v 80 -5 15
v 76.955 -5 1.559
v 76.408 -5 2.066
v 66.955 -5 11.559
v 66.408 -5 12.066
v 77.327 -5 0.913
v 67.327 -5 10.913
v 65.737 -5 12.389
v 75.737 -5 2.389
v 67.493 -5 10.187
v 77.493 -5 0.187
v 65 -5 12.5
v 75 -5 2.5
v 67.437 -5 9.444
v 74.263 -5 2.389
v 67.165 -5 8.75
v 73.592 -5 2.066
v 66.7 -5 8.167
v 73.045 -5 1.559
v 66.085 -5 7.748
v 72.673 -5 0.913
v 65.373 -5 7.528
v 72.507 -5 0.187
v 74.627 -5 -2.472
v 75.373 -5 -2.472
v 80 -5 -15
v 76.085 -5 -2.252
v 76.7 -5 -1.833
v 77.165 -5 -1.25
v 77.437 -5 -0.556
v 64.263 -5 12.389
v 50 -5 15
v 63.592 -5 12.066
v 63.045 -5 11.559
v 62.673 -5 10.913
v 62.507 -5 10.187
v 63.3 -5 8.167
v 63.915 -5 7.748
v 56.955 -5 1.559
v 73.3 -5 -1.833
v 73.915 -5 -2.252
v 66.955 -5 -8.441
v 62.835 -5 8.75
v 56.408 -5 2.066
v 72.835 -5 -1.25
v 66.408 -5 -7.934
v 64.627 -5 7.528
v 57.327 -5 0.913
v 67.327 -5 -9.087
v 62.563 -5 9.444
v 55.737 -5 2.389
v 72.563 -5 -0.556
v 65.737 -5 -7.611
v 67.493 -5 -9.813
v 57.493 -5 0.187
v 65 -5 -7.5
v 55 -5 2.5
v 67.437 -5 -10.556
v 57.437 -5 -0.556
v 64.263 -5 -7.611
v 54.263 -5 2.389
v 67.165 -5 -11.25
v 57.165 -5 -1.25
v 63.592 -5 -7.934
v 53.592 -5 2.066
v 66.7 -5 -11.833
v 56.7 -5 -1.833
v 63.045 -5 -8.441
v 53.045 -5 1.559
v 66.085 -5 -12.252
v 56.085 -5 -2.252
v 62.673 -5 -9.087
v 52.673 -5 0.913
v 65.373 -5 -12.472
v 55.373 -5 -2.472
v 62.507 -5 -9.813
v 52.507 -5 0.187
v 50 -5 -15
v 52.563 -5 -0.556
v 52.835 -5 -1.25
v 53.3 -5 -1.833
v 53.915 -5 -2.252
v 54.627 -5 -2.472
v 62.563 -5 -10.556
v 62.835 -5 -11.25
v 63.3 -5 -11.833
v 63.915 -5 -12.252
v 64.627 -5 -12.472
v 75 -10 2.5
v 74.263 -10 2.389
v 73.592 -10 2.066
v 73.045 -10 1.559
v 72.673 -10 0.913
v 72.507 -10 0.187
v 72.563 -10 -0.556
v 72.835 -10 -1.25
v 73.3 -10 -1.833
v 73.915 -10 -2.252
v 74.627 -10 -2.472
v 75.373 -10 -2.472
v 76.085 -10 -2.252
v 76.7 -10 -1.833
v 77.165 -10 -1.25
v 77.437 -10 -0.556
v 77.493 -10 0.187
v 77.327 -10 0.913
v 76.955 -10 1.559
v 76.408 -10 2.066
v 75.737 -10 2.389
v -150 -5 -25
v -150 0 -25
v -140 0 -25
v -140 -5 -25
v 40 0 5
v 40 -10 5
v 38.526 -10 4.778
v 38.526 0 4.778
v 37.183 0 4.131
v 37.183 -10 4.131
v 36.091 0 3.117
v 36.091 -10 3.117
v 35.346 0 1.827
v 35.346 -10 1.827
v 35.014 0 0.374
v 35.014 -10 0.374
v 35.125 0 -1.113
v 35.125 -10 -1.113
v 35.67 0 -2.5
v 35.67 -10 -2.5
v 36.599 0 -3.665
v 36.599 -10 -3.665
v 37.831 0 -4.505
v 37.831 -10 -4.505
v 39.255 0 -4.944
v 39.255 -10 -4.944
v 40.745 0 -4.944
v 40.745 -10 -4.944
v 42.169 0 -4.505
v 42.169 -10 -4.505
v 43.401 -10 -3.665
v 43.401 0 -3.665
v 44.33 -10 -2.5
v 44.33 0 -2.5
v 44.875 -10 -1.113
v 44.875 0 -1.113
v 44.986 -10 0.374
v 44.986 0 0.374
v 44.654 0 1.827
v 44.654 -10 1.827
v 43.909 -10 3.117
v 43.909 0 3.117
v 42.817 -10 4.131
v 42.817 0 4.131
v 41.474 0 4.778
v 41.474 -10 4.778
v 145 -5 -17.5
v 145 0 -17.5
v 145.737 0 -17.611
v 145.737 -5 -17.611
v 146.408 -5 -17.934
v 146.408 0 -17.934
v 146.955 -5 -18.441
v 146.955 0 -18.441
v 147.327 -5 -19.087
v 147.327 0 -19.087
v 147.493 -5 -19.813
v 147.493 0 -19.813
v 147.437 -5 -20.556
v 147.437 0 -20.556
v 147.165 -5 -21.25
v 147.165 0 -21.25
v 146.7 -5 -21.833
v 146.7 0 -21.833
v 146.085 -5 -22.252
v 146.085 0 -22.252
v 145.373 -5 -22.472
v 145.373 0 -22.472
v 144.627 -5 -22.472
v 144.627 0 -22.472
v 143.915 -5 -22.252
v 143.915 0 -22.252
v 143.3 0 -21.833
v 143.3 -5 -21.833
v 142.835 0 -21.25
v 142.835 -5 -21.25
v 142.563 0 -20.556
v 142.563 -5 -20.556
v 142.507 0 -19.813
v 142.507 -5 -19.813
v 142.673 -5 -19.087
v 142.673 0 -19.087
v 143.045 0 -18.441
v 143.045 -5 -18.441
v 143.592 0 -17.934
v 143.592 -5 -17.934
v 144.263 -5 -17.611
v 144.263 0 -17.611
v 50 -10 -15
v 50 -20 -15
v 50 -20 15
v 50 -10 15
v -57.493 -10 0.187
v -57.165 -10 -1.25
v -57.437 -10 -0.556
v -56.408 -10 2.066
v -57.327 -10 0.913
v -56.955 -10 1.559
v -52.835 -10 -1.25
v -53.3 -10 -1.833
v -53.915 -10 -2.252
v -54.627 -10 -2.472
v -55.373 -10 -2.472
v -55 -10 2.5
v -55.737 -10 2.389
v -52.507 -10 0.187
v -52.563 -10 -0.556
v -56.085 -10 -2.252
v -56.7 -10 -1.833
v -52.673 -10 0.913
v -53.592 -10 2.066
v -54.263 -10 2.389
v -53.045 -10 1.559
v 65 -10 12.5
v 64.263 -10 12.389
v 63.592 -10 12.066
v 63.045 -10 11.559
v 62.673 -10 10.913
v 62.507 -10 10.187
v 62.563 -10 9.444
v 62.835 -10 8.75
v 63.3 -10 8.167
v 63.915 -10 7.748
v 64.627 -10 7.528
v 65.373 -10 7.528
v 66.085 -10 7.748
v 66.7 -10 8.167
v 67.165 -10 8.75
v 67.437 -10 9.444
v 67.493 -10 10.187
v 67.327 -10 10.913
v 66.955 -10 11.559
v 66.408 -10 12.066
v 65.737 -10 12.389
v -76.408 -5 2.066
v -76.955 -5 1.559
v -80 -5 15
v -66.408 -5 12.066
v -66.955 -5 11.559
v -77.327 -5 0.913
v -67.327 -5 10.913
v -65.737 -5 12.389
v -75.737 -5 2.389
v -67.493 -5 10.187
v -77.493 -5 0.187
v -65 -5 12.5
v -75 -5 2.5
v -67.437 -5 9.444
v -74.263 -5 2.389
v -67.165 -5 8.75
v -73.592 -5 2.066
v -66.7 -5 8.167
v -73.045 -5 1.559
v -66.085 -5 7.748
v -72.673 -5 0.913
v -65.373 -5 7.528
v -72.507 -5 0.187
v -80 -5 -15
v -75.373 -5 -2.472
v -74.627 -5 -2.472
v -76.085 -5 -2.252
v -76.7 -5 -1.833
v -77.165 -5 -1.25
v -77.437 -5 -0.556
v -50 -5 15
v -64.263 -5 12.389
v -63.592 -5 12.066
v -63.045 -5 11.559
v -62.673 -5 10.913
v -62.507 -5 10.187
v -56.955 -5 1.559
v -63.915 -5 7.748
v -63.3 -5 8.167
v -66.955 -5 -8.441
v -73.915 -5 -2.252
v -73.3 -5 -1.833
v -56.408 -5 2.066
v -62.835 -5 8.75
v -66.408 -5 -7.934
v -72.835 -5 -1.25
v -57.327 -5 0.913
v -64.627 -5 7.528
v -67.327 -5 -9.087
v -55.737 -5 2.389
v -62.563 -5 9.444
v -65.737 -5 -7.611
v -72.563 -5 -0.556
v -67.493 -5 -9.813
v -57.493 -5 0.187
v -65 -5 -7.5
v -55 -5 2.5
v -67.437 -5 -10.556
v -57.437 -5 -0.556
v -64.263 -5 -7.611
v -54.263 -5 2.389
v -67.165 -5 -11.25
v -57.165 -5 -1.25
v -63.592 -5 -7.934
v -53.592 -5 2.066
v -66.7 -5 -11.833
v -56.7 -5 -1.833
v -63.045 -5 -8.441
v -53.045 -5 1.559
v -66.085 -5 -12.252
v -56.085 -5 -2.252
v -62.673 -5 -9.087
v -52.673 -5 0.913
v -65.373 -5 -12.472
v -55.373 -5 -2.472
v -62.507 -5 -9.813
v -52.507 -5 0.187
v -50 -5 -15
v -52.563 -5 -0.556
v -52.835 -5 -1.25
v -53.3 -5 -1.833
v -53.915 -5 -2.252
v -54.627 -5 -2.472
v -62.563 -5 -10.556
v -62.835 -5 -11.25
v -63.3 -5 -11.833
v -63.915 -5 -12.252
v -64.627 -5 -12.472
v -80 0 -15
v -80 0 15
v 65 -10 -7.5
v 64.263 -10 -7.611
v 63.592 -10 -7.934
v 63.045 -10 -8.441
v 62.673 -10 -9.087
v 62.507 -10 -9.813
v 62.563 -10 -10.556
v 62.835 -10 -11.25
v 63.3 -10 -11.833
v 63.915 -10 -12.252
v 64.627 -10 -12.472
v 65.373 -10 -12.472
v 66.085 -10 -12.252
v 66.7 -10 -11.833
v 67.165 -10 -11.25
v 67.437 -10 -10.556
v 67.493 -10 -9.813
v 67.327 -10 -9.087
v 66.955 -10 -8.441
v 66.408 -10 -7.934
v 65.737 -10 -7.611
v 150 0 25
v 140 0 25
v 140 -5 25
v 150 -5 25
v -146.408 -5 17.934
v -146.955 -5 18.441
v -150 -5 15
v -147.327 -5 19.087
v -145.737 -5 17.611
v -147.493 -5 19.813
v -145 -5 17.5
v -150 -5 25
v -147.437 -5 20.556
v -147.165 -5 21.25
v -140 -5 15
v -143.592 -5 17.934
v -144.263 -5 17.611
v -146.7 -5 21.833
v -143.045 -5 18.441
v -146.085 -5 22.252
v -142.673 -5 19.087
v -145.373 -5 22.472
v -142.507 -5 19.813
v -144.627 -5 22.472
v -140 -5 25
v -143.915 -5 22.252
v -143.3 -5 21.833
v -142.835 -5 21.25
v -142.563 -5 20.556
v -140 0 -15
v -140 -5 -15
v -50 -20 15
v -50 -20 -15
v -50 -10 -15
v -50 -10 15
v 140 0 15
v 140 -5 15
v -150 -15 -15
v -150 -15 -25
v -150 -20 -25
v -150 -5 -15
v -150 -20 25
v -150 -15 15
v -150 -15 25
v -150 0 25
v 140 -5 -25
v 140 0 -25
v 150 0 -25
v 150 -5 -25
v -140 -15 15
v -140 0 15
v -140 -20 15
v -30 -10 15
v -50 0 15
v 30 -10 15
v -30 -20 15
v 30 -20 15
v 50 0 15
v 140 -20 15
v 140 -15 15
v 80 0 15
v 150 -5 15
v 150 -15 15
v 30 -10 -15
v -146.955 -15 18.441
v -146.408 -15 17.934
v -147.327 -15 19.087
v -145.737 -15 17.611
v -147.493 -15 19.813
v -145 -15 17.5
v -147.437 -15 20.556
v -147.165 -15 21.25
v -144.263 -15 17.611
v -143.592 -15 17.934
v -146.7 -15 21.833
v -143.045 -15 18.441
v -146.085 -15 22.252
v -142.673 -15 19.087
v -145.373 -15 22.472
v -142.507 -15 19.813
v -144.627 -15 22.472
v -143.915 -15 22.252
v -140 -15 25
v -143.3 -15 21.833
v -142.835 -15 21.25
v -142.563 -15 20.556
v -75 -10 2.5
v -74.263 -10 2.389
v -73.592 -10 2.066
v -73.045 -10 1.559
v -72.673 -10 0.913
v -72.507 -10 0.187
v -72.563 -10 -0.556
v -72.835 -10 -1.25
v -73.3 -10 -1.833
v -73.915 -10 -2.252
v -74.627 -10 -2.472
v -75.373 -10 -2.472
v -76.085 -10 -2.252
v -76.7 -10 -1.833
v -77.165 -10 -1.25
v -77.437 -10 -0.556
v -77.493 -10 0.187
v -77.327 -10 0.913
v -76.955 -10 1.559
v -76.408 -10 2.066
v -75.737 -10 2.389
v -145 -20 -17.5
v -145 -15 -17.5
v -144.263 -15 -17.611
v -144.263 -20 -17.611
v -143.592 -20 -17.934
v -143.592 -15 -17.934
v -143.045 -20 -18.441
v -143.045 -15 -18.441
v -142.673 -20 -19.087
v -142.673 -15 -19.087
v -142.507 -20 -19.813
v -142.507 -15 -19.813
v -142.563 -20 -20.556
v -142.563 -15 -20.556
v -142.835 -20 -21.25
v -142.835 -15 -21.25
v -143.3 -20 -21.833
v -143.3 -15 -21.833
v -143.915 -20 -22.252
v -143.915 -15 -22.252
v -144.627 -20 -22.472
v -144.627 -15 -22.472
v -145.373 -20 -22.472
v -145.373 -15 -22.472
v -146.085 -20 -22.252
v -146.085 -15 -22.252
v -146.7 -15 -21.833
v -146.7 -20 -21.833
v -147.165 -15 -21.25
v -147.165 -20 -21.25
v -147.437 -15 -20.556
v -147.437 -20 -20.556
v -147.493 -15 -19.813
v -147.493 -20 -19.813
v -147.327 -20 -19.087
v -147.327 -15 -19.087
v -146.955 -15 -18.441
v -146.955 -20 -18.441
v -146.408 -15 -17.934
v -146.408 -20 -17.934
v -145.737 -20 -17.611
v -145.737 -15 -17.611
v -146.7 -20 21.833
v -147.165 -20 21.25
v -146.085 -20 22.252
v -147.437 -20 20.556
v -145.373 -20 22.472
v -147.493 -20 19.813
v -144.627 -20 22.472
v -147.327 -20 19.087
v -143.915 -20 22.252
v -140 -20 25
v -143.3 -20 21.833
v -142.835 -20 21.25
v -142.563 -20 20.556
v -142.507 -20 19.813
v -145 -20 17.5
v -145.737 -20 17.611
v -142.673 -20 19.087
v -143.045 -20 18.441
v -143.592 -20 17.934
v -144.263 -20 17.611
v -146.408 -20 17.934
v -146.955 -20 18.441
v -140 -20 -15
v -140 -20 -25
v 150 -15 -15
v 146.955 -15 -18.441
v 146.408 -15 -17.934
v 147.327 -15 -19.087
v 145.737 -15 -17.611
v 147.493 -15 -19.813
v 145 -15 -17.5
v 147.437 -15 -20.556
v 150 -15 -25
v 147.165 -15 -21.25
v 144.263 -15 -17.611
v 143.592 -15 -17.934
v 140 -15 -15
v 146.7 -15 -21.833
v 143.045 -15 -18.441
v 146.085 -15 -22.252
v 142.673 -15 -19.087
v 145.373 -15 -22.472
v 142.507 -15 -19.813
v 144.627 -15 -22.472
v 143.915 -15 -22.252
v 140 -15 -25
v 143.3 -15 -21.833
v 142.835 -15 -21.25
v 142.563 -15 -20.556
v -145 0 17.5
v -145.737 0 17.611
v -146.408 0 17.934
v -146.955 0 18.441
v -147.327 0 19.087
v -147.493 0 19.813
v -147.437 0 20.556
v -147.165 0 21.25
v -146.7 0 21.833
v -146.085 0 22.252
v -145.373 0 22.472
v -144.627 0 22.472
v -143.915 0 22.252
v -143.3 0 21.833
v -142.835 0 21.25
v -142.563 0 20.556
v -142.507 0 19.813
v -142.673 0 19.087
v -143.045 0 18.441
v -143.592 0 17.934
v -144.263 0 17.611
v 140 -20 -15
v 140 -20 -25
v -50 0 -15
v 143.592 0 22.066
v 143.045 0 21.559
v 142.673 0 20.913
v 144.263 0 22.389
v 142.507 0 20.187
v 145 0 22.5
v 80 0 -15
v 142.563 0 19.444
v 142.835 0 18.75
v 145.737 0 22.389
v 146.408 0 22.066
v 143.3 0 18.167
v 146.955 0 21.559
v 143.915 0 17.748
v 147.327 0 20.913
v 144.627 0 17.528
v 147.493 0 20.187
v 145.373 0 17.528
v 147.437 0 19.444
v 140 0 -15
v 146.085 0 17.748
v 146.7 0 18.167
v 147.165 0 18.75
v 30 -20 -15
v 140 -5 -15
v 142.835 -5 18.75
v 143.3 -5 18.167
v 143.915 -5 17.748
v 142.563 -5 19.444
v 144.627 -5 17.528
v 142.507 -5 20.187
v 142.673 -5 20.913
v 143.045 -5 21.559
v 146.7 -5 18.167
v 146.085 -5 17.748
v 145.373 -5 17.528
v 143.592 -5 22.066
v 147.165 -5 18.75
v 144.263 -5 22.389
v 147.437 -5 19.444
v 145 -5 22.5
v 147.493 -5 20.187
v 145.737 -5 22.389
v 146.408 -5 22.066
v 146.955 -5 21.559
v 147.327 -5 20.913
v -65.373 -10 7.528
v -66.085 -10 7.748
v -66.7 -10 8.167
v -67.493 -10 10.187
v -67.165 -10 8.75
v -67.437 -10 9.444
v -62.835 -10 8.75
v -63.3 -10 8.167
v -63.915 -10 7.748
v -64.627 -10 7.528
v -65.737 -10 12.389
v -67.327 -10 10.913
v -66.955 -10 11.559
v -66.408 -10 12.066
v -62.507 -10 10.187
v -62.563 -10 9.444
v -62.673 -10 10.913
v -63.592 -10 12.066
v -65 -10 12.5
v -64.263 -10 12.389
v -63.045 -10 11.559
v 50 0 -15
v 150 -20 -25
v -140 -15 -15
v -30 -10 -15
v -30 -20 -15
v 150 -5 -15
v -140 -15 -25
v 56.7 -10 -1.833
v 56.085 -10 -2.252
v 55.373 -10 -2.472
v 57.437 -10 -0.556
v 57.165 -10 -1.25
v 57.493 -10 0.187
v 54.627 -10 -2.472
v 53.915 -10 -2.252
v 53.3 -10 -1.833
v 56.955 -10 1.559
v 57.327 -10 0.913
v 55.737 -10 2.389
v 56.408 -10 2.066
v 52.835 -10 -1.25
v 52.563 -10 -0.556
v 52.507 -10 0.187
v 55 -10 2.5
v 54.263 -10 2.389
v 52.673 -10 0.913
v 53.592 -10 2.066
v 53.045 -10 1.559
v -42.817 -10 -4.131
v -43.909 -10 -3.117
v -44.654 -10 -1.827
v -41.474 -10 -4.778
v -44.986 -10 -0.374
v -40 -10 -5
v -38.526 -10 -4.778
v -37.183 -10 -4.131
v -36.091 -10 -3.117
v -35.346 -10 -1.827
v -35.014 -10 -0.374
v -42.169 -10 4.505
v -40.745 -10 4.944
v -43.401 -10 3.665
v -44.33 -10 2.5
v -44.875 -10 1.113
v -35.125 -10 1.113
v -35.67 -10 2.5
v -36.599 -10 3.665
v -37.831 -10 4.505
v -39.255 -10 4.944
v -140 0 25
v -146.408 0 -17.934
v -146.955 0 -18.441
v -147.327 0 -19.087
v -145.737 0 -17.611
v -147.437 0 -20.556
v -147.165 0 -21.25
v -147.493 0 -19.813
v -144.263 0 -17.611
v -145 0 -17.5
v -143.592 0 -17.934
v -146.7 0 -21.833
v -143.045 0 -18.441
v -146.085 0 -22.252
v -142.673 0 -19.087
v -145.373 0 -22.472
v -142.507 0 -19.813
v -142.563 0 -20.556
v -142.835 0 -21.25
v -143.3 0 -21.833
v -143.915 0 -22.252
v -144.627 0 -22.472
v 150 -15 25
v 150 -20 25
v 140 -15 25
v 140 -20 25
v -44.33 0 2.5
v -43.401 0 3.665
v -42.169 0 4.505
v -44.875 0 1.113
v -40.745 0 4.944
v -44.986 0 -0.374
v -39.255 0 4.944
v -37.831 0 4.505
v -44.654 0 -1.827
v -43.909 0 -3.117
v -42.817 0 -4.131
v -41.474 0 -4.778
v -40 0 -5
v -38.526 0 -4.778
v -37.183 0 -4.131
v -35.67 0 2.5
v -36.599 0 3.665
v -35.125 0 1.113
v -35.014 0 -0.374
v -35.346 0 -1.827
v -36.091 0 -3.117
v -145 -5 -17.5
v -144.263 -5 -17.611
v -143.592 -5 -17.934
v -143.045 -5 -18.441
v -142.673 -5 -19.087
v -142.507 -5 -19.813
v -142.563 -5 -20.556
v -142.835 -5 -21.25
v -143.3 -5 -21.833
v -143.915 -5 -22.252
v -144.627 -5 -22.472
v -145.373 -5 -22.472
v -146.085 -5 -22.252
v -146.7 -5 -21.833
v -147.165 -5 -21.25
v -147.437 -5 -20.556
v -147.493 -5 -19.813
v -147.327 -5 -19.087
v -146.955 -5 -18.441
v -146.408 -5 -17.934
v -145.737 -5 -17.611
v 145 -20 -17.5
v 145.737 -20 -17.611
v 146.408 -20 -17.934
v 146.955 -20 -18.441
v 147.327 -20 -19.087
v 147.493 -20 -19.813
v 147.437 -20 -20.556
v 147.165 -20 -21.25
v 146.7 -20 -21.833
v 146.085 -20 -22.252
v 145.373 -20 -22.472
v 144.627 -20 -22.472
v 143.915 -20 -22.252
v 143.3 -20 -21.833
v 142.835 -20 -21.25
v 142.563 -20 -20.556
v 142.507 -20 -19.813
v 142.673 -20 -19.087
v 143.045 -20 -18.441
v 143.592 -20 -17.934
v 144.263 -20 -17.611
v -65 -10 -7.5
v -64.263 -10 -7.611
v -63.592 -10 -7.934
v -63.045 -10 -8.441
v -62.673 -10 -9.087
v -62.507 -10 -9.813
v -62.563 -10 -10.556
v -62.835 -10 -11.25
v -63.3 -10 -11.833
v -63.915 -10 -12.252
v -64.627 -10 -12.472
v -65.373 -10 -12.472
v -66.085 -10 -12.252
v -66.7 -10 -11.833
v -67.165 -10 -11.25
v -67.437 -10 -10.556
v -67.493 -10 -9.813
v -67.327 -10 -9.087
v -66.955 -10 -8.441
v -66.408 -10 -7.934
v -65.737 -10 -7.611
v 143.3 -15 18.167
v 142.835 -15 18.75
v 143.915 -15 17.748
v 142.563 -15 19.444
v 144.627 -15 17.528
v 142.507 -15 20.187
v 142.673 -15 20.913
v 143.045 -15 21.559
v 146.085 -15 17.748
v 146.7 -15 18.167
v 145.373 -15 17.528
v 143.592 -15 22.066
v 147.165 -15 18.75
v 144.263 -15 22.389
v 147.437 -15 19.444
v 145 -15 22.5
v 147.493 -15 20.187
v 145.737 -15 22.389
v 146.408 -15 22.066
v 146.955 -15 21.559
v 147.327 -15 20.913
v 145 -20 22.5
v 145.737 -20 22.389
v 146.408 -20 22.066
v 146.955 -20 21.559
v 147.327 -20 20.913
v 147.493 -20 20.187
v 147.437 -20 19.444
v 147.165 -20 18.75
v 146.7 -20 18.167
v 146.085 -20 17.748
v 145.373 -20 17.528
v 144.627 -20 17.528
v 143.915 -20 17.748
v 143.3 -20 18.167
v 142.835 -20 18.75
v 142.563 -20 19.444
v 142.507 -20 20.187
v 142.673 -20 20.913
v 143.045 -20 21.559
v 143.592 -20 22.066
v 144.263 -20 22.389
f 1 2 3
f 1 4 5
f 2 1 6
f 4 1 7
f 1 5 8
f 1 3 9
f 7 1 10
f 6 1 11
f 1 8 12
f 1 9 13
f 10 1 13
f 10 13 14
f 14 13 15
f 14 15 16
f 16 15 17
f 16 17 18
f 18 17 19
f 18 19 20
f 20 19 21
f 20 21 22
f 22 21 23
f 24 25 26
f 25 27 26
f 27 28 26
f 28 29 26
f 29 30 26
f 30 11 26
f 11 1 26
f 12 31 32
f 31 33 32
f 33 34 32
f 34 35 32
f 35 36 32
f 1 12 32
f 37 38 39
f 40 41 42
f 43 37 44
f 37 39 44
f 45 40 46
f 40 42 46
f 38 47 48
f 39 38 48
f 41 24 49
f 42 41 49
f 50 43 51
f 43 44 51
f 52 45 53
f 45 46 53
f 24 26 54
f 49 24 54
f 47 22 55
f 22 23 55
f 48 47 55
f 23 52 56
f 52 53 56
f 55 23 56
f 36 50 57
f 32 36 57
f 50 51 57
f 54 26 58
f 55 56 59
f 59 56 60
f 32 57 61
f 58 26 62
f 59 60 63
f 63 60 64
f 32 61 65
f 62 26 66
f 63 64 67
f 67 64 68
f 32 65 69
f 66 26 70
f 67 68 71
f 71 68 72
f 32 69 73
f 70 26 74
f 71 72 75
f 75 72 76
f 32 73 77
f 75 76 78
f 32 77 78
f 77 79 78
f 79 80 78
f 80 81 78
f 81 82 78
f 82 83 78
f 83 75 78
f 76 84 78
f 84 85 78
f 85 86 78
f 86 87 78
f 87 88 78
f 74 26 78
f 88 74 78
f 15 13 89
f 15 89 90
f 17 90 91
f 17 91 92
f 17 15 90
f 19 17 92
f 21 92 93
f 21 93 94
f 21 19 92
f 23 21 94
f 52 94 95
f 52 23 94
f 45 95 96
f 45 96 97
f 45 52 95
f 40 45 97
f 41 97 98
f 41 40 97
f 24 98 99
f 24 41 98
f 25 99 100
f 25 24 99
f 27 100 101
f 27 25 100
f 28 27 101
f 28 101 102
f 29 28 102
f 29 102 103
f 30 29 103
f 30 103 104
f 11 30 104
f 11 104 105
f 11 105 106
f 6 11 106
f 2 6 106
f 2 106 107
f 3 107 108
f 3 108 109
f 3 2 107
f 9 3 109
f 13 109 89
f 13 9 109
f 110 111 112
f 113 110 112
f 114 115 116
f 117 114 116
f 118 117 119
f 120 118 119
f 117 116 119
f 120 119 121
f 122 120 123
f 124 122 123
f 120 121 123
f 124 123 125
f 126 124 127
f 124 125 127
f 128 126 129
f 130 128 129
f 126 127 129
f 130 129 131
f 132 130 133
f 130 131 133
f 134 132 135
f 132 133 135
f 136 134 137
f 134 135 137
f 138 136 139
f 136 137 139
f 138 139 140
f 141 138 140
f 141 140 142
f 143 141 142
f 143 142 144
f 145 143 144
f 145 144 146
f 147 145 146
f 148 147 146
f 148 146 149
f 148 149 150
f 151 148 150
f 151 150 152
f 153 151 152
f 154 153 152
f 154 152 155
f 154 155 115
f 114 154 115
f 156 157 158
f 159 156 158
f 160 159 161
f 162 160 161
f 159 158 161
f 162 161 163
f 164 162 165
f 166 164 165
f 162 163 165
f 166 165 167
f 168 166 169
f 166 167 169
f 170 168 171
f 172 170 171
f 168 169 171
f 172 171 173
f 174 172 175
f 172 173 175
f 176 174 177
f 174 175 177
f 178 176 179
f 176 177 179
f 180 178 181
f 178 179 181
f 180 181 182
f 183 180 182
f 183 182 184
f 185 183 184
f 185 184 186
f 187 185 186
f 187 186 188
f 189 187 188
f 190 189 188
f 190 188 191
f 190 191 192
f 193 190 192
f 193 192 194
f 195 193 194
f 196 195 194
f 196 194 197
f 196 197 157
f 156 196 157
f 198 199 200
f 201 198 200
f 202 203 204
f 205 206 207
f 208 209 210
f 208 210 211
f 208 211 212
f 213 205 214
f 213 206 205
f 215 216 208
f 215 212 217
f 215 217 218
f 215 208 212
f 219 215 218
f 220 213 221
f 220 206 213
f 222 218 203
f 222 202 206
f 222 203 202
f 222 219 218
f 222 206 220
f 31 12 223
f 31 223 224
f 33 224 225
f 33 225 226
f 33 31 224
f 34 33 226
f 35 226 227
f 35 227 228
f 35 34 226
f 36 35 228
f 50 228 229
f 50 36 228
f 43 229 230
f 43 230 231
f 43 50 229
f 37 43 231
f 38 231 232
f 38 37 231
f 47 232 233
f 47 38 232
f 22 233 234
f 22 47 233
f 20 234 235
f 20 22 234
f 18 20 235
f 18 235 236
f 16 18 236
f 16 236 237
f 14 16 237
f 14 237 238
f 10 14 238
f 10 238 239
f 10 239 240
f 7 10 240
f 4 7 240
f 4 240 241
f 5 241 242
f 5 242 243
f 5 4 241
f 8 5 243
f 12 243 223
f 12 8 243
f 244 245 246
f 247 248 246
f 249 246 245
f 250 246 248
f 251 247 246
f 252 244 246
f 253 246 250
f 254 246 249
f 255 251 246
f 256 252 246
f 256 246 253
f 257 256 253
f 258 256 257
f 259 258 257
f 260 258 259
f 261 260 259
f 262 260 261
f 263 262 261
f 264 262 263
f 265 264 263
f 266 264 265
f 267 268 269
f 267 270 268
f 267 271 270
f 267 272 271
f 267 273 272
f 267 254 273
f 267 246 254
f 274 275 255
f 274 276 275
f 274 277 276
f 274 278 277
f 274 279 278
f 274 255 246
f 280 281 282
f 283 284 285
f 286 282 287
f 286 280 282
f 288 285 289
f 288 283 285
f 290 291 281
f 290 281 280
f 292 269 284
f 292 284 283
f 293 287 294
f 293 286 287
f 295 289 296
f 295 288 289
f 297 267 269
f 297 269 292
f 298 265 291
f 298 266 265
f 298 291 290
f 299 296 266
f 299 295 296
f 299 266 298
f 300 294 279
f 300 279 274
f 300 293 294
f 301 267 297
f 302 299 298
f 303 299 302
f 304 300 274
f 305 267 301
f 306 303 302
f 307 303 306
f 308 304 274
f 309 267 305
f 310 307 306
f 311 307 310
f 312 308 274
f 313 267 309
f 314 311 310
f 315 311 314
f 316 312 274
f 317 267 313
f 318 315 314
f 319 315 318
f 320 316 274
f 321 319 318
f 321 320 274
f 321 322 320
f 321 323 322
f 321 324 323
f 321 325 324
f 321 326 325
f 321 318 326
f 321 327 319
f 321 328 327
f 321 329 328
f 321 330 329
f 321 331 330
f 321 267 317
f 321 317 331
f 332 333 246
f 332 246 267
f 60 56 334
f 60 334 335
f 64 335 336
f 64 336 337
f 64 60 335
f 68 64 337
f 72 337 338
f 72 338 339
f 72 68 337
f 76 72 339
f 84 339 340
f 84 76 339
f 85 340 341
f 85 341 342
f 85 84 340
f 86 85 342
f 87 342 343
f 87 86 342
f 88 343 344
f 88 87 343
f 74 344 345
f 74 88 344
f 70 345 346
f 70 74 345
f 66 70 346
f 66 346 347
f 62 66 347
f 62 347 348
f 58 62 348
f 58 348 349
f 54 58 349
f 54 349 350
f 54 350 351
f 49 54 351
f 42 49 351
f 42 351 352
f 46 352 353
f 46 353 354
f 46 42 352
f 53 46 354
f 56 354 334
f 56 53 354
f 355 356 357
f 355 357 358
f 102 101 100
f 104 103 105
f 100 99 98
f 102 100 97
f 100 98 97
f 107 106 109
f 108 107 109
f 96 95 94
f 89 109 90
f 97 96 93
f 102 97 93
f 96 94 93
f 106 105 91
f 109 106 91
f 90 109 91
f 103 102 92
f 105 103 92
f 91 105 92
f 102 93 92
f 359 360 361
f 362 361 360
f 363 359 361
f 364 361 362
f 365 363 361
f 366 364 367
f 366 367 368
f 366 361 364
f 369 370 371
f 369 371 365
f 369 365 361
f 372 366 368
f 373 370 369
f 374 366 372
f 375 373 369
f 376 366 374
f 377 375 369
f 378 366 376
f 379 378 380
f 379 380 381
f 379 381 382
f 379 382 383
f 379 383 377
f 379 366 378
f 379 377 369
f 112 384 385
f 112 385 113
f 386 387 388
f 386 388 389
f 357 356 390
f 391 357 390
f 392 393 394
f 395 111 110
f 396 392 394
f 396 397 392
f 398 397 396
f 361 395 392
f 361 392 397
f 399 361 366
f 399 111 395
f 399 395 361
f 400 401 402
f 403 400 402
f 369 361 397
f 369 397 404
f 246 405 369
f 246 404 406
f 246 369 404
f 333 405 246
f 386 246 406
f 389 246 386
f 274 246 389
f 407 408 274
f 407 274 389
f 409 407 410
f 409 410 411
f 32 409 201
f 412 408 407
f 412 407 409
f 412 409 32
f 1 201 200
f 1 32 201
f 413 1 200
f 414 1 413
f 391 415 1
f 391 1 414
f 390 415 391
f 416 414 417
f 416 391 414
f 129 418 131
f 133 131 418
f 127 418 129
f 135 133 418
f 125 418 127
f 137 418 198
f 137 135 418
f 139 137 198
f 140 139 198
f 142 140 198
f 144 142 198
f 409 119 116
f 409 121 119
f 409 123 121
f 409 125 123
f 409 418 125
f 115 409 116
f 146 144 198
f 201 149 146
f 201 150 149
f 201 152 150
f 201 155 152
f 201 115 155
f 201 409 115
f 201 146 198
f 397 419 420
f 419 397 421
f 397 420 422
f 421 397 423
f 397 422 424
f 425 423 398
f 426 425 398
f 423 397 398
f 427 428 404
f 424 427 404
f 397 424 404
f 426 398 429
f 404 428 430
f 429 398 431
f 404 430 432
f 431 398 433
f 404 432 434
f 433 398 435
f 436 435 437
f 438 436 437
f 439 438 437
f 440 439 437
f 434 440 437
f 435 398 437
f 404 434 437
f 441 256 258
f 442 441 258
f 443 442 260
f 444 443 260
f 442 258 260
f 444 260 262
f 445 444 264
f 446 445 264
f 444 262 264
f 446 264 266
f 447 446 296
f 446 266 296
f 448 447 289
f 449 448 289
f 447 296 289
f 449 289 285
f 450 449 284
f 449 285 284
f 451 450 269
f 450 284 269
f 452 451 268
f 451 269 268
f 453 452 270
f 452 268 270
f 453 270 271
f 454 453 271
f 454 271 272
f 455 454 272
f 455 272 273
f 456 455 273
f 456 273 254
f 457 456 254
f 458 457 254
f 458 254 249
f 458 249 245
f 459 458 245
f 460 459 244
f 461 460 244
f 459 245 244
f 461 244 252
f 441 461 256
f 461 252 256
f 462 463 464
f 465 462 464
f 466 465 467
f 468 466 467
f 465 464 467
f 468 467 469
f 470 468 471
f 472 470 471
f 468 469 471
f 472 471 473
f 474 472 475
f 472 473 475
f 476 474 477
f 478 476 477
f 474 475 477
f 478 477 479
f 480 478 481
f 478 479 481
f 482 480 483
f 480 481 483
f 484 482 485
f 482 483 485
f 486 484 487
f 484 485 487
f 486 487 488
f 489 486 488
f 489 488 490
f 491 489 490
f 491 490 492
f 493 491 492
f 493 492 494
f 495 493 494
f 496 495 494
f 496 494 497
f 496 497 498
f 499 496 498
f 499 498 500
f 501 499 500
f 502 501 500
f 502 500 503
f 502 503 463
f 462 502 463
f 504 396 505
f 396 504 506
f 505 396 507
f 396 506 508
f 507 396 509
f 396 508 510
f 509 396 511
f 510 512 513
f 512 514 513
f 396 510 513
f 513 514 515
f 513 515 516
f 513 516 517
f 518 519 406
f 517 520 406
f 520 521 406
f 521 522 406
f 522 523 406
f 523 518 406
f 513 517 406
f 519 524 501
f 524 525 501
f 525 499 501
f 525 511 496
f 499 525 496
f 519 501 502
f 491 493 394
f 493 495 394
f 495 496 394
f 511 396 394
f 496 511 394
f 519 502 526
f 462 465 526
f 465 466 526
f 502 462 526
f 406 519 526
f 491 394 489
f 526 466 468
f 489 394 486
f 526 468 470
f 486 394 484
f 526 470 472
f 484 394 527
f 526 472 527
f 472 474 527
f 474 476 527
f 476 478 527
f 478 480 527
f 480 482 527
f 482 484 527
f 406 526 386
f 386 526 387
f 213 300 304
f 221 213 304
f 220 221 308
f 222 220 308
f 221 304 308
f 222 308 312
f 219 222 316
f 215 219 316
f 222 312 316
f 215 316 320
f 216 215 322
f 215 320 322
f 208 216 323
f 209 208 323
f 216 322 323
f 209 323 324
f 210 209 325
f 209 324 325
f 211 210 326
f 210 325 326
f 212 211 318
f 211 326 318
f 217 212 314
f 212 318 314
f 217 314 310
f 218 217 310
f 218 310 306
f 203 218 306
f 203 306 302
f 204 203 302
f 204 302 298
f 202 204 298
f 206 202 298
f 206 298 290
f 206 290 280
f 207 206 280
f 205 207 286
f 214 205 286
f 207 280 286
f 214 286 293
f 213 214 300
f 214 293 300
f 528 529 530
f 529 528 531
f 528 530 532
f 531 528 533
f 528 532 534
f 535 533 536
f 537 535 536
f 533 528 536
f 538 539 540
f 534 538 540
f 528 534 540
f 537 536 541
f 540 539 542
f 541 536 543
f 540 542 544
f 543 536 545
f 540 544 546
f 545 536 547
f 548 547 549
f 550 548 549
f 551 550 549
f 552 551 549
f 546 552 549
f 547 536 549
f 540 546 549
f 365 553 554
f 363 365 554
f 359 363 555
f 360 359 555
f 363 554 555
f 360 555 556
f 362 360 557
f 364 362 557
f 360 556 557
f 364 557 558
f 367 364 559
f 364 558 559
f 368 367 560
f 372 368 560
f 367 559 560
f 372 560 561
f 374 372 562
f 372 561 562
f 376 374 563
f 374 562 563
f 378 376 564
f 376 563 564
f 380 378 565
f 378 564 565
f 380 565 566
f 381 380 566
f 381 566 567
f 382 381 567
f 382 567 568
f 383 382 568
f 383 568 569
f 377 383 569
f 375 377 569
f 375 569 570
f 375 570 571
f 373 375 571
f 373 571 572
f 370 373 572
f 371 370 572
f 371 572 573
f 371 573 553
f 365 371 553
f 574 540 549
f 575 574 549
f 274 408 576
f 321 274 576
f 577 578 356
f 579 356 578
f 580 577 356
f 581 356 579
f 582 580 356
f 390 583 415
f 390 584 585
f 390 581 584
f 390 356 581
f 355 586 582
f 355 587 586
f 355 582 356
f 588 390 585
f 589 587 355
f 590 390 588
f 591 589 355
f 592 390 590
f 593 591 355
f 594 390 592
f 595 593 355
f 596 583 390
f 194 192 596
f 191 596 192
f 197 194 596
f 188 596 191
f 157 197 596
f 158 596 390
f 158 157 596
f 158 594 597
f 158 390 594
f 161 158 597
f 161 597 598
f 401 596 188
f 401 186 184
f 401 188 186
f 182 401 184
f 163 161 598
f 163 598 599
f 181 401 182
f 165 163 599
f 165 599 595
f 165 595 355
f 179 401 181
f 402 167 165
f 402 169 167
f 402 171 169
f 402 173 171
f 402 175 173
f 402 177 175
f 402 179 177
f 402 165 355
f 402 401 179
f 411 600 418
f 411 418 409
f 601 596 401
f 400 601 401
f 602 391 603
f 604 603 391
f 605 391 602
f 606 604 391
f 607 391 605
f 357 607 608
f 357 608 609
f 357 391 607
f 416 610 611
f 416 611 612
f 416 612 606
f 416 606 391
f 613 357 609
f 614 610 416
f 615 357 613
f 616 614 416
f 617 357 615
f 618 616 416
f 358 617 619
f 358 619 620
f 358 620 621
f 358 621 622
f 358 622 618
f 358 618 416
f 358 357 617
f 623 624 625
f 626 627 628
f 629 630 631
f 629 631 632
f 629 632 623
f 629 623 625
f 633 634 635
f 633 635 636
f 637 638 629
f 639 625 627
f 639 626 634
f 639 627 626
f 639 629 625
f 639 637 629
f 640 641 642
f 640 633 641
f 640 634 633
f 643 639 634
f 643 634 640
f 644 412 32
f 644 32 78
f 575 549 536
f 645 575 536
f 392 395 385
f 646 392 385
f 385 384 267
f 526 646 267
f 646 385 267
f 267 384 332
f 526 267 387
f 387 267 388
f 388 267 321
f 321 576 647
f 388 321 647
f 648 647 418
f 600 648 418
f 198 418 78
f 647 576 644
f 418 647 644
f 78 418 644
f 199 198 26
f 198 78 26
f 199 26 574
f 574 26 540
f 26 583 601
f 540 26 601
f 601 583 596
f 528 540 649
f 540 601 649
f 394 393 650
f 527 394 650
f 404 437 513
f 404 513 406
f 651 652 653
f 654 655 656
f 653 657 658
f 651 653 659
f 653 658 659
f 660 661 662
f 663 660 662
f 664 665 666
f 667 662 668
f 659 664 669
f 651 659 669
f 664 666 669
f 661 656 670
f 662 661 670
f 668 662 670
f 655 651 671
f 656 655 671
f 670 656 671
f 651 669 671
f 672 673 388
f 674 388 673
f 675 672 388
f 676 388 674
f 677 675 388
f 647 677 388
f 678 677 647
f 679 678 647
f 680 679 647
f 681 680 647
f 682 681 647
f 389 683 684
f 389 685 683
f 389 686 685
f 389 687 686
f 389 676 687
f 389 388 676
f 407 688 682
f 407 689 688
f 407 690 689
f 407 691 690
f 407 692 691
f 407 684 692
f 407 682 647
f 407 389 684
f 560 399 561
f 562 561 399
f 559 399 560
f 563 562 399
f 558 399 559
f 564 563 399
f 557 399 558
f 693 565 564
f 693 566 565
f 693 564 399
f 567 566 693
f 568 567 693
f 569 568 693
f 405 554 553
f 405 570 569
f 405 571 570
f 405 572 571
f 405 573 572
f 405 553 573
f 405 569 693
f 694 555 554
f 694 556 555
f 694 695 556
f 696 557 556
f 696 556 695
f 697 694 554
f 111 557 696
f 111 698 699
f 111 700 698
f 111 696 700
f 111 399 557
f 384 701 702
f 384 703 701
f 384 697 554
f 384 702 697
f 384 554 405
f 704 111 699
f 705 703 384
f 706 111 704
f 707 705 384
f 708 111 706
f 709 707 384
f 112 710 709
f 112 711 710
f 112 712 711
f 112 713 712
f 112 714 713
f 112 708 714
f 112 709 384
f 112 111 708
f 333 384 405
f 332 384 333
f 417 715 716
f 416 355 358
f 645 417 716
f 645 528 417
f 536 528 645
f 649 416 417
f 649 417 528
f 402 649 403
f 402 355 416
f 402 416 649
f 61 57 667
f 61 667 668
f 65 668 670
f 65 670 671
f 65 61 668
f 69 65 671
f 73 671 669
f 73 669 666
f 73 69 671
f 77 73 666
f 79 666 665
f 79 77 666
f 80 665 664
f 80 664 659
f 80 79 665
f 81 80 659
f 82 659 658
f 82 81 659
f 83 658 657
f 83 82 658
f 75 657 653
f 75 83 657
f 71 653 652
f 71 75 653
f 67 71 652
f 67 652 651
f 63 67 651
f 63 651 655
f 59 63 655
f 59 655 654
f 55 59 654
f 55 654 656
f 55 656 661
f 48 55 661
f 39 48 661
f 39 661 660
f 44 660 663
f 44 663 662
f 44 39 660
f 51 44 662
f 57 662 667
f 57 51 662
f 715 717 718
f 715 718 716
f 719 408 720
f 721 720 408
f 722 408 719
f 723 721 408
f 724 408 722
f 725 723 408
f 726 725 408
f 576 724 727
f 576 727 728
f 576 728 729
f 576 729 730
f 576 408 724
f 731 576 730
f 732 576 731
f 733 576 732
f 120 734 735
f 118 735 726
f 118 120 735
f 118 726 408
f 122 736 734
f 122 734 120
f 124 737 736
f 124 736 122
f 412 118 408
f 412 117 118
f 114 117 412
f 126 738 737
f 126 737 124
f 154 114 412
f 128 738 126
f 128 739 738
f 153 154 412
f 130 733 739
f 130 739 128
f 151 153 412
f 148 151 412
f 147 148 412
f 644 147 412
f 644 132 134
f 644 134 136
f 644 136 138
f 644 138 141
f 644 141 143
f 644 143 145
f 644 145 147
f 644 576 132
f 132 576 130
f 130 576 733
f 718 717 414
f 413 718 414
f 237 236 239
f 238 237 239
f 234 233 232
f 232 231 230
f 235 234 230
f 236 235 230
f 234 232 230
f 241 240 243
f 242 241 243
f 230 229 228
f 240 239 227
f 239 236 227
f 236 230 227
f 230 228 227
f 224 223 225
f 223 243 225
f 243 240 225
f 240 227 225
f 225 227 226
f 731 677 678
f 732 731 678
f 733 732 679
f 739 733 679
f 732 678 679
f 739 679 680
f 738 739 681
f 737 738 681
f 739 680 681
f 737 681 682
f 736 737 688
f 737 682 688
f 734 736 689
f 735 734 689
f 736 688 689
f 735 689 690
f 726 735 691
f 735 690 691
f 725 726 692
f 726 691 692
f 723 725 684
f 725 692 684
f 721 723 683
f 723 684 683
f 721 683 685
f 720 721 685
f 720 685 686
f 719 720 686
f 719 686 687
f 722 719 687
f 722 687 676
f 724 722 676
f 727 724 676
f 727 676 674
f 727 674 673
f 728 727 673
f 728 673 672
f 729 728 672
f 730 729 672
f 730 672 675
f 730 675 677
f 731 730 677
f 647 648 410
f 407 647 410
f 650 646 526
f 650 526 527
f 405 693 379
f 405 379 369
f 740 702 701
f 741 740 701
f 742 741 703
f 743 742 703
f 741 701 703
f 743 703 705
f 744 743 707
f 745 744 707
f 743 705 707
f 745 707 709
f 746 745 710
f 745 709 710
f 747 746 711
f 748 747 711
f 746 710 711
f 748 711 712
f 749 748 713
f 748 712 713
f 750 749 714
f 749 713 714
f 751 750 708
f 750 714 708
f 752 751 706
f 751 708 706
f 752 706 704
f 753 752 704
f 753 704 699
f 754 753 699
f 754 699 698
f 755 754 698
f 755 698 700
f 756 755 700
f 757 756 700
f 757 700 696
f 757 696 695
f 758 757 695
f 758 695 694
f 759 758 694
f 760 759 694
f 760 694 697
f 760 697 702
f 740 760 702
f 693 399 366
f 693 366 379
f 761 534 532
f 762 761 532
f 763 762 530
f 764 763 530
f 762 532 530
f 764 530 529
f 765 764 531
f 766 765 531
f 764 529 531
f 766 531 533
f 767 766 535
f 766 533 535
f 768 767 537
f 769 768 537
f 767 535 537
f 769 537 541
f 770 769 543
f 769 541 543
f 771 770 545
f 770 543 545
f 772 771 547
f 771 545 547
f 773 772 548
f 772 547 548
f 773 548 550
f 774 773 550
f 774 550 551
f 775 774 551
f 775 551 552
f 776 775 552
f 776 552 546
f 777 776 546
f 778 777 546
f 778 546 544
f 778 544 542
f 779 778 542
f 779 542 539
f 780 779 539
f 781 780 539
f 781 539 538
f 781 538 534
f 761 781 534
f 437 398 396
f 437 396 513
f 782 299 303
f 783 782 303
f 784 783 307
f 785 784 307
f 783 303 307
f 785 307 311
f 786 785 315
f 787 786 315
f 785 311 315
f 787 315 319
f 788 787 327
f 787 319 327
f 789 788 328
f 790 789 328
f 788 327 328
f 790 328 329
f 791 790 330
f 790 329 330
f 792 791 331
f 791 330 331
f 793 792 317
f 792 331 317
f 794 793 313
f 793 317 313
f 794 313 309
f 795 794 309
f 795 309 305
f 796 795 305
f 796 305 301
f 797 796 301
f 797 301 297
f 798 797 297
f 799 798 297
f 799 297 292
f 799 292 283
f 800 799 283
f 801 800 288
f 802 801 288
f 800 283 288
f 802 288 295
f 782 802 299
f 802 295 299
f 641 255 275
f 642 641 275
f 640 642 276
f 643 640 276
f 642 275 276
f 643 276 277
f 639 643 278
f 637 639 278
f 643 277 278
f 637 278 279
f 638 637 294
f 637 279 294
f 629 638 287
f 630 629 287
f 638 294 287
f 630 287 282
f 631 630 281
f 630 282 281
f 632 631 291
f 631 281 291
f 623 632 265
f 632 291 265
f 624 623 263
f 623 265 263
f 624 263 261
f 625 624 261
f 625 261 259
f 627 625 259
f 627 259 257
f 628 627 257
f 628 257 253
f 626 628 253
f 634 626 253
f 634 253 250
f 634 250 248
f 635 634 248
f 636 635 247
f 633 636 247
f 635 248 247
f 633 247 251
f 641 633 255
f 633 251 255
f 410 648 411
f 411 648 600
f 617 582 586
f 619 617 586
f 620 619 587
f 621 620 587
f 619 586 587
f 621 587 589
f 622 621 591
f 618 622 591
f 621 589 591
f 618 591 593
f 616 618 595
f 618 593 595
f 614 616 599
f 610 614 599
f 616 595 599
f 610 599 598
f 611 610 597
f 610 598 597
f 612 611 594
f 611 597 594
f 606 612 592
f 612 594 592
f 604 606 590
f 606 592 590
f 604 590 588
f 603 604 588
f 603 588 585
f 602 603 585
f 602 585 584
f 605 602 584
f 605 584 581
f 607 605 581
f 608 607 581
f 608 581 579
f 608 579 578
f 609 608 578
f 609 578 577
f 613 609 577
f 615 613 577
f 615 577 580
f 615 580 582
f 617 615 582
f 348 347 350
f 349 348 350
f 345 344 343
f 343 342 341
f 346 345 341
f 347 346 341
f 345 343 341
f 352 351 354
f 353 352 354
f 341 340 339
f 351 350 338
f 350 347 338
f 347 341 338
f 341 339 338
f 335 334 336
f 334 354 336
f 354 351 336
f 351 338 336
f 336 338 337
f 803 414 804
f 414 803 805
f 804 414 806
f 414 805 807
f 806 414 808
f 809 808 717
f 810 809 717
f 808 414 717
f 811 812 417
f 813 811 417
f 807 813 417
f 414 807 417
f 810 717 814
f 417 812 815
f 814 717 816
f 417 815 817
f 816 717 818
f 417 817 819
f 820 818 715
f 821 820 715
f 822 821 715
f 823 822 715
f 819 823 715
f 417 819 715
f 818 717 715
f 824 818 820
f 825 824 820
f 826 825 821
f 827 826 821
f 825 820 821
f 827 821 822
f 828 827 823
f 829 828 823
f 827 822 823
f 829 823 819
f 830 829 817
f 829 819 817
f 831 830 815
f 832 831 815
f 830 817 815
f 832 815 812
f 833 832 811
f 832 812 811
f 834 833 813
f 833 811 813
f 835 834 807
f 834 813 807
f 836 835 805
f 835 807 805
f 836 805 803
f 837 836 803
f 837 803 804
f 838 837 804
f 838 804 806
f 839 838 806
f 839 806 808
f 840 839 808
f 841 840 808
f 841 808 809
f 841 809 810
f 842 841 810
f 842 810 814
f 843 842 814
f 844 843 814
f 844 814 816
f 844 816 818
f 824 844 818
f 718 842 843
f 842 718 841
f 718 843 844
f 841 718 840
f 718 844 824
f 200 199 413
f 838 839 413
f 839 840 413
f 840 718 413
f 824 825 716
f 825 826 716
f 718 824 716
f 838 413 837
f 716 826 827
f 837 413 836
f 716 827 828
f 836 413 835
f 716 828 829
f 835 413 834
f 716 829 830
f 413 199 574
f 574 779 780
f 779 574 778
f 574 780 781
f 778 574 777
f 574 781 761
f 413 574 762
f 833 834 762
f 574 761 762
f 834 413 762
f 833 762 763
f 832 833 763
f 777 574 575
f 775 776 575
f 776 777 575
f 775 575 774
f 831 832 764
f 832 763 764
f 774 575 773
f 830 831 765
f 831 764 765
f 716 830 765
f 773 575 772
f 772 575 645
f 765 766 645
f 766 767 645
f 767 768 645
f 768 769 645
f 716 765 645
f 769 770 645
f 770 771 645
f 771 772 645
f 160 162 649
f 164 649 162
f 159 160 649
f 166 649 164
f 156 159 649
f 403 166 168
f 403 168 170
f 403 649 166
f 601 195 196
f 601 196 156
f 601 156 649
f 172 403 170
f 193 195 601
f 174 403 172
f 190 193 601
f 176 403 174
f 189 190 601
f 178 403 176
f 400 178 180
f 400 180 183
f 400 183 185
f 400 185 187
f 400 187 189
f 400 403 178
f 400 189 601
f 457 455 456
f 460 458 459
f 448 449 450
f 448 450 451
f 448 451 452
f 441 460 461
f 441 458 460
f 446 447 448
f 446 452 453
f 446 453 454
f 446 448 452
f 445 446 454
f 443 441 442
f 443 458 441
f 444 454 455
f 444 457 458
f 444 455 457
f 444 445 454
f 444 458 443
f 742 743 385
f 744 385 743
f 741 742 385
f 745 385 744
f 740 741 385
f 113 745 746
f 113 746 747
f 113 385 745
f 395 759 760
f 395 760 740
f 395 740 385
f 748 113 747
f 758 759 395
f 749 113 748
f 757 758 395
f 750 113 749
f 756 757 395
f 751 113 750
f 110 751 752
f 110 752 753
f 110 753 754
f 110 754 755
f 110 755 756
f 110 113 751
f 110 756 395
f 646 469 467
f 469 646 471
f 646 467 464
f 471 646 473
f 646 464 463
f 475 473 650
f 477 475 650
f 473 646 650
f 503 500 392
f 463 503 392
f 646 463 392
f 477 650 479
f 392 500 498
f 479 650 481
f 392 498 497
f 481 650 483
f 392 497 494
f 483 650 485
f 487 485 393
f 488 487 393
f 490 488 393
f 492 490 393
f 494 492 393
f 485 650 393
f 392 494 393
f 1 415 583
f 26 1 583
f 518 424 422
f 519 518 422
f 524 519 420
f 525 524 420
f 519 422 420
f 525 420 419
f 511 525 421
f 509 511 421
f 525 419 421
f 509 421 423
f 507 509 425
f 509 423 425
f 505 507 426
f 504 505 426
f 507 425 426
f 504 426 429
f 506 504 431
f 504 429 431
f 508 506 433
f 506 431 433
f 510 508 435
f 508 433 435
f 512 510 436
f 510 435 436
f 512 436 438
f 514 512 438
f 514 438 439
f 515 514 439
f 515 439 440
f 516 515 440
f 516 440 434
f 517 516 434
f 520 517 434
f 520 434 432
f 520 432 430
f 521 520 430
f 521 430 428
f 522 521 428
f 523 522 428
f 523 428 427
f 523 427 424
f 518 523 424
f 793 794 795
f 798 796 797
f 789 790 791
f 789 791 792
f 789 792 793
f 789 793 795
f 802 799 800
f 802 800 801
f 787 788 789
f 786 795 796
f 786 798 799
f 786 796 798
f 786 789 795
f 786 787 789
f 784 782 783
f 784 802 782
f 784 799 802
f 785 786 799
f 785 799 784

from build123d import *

# Parameters (mm, degrees)
SKETCH1_W           = 300
SKETCH1_H           = 30
SKETCH1_W_2         = 10
SKETCH1_H_2         = 10
BOSS_EXTRUDE1_DEPTH = 20
SKETCH12_W          = 10
SKETCH12_H          = 10
CUT_EXTRUDE5_DEPTH  = 10
SKETCH14_W          = 10
SKETCH14_H          = 10
CUT_EXTRUDE6_DEPTH  = 10
SKETCH3_W           = 20
SKETCH3_H           = 30
CUT_EXTRUDE1_DEPTH  = 10
SKETCH5_R           = 2.5
CUT_EXTRUDE3_DEPTH  = 154.378616502
CUT_EXTRUDE4_REACH  = 154.398
SKETCH7_R           = 5
SKETCH15_W          = 30
SKETCH15_H          = 30
CUT_EXTRUDE7_DEPTH  = 5
SKETCH16_R          = 2.5
CUT_EXTRUDE8_DEPTH  = 5


with BuildPart() as part:
    # Sketch1 → Boss-Extrude1 (new body)
    with BuildSketch(Plane(origin=(0, 0, 0), x_dir=(1, 0, 0), z_dir=(0, 1, 0))):
        Rectangle(SKETCH1_W, SKETCH1_H)
        with Locations((-145, -20)):
            Rectangle(SKETCH1_W_2, SKETCH1_H_2)
        with Locations((-145, 20)):
            Rectangle(SKETCH1_W_2, SKETCH1_H_2)
        with Locations((145, 20)):
            Rectangle(SKETCH1_W_2, SKETCH1_H_2)
        with Locations((145, -20)):
            Rectangle(SKETCH1_W_2, SKETCH1_H_2)
    extrude(amount=-BOSS_EXTRUDE1_DEPTH)

    # Sketch12 → Cut-Extrude5 (cut)
    with BuildSketch(Plane.XY.offset(25)):
        with Locations((-145, -10)):
            Rectangle(SKETCH12_W, SKETCH12_H)
        with Locations((145, -10)):
            Rectangle(SKETCH12_W, SKETCH12_H)
    extrude(amount=-CUT_EXTRUDE5_DEPTH, mode=Mode.SUBTRACT)

    # Sketch14 → Cut-Extrude6 (cut)
    with BuildSketch(Plane(origin=(0, 0, -25), x_dir=(-1, 0, 0), z_dir=(0, 0, -1))):
        with Locations((-145, -10)):
            Rectangle(SKETCH14_W, SKETCH14_H)
        with Locations((145, -10)):
            Rectangle(SKETCH14_W, SKETCH14_H)
    extrude(amount=-CUT_EXTRUDE6_DEPTH, mode=Mode.SUBTRACT)

    # Sketch3 → Cut-Extrude1 (cut)
    with BuildSketch(Plane.XZ.offset(20)):
        with Locations((-40, 0)):
            Rectangle(SKETCH3_W, SKETCH3_H)
        with Locations((40, 0)):
            Rectangle(SKETCH3_W, SKETCH3_H)
    extrude(amount=-CUT_EXTRUDE1_DEPTH, mode=Mode.SUBTRACT)

    # Sketch5 → Cut-Extrude3 (cut, through all)
    with BuildSketch(Plane(origin=(0, 0, 0), x_dir=(1, 0, 0), z_dir=(0, 1, 0))):
        with Locations(Location((145, -20, 0), (0, 0, 270))):
            Circle(SKETCH5_R)
        with Locations(Location((145, 20, 0), (0, 0, 270))):
            Circle(SKETCH5_R)
        with Locations(Location((-145, 20, 0), (0, 0, 270))):
            Circle(SKETCH5_R)
        with Locations(Location((-145, -20, 0), (0, 0, 90))):
            Circle(SKETCH5_R)
    extrude(amount=-CUT_EXTRUDE3_DEPTH, mode=Mode.SUBTRACT)

    # Sketch7 → Cut-Extrude4 (cut, up to next)
    with BuildSketch(Plane.XZ.offset(10), mode=Mode.PRIVATE) as cut_extrude4_sk1:
        with Locations(Location((-40, 0, 0), (0, 0, 270))):
            Circle(SKETCH7_R)
    cut_extrude4_tool1 = extrude(cut_extrude4_sk1.sketch, amount=-CUT_EXTRUDE4_REACH, mode=Mode.PRIVATE) & part.part
    # Sketch7 → Cut-Extrude4 (cut, up to next)
    with BuildSketch(Plane.XZ.offset(10), mode=Mode.PRIVATE) as cut_extrude4_sk2:
        with Locations(Location((40, 0, 0), (0, 0, 90))):
            Circle(SKETCH7_R)
    cut_extrude4_tool2 = extrude(cut_extrude4_sk2.sketch, amount=-CUT_EXTRUDE4_REACH, mode=Mode.PRIVATE) & part.part
    add(cut_extrude4_tool1.solids().sort_by_distance((-40, -10, 0))[0], mode=Mode.SUBTRACT)
    add(cut_extrude4_tool2.solids().sort_by_distance((40, -10, 0))[0], mode=Mode.SUBTRACT)

    # Sketch15 → Cut-Extrude7 (cut)
    with BuildSketch(Plane(origin=(0, 0, 0), x_dir=(1, 0, 0), z_dir=(0, 1, 0))):
        with Locations((-65, 0)):
            Rectangle(SKETCH15_W, SKETCH15_H)
    cut_extrude7 = extrude(amount=-CUT_EXTRUDE7_DEPTH, mode=Mode.SUBTRACT)

    # Mirror1: Cut-Extrude7 across plane
    add(cut_extrude7.mirror(Plane(origin=(0, 0, 0), x_dir=(0, 0, 1), z_dir=(1, 0, 0))), mode=Mode.SUBTRACT)

    # Sketch16 → Cut-Extrude8 (cut)
    with BuildSketch(Plane(origin=(0, -5, 0), x_dir=(1, 0, 0), z_dir=(0, 1, 0))):
        with Locations(Location((-65, 10, 0), (0, 0, 270))):
            Circle(SKETCH16_R)
        with Locations(Location((-75, 0, 0), (0, 0, 270))):
            Circle(SKETCH16_R)
        with Locations(Location((-65, -10, 0), (0, 0, 270))):
            Circle(SKETCH16_R)
        with Locations(Location((-55, 0, 0), (0, 0, 270))):
            Circle(SKETCH16_R)
    cut_extrude8 = extrude(amount=-CUT_EXTRUDE8_DEPTH, mode=Mode.SUBTRACT)

    # Mirror2: Cut-Extrude8 across plane
    add(cut_extrude8.mirror(Plane(origin=(0, 0, 0), x_dir=(0, 0, 1), z_dir=(1, 0, 0))), mode=Mode.SUBTRACT)


solid = part.part
